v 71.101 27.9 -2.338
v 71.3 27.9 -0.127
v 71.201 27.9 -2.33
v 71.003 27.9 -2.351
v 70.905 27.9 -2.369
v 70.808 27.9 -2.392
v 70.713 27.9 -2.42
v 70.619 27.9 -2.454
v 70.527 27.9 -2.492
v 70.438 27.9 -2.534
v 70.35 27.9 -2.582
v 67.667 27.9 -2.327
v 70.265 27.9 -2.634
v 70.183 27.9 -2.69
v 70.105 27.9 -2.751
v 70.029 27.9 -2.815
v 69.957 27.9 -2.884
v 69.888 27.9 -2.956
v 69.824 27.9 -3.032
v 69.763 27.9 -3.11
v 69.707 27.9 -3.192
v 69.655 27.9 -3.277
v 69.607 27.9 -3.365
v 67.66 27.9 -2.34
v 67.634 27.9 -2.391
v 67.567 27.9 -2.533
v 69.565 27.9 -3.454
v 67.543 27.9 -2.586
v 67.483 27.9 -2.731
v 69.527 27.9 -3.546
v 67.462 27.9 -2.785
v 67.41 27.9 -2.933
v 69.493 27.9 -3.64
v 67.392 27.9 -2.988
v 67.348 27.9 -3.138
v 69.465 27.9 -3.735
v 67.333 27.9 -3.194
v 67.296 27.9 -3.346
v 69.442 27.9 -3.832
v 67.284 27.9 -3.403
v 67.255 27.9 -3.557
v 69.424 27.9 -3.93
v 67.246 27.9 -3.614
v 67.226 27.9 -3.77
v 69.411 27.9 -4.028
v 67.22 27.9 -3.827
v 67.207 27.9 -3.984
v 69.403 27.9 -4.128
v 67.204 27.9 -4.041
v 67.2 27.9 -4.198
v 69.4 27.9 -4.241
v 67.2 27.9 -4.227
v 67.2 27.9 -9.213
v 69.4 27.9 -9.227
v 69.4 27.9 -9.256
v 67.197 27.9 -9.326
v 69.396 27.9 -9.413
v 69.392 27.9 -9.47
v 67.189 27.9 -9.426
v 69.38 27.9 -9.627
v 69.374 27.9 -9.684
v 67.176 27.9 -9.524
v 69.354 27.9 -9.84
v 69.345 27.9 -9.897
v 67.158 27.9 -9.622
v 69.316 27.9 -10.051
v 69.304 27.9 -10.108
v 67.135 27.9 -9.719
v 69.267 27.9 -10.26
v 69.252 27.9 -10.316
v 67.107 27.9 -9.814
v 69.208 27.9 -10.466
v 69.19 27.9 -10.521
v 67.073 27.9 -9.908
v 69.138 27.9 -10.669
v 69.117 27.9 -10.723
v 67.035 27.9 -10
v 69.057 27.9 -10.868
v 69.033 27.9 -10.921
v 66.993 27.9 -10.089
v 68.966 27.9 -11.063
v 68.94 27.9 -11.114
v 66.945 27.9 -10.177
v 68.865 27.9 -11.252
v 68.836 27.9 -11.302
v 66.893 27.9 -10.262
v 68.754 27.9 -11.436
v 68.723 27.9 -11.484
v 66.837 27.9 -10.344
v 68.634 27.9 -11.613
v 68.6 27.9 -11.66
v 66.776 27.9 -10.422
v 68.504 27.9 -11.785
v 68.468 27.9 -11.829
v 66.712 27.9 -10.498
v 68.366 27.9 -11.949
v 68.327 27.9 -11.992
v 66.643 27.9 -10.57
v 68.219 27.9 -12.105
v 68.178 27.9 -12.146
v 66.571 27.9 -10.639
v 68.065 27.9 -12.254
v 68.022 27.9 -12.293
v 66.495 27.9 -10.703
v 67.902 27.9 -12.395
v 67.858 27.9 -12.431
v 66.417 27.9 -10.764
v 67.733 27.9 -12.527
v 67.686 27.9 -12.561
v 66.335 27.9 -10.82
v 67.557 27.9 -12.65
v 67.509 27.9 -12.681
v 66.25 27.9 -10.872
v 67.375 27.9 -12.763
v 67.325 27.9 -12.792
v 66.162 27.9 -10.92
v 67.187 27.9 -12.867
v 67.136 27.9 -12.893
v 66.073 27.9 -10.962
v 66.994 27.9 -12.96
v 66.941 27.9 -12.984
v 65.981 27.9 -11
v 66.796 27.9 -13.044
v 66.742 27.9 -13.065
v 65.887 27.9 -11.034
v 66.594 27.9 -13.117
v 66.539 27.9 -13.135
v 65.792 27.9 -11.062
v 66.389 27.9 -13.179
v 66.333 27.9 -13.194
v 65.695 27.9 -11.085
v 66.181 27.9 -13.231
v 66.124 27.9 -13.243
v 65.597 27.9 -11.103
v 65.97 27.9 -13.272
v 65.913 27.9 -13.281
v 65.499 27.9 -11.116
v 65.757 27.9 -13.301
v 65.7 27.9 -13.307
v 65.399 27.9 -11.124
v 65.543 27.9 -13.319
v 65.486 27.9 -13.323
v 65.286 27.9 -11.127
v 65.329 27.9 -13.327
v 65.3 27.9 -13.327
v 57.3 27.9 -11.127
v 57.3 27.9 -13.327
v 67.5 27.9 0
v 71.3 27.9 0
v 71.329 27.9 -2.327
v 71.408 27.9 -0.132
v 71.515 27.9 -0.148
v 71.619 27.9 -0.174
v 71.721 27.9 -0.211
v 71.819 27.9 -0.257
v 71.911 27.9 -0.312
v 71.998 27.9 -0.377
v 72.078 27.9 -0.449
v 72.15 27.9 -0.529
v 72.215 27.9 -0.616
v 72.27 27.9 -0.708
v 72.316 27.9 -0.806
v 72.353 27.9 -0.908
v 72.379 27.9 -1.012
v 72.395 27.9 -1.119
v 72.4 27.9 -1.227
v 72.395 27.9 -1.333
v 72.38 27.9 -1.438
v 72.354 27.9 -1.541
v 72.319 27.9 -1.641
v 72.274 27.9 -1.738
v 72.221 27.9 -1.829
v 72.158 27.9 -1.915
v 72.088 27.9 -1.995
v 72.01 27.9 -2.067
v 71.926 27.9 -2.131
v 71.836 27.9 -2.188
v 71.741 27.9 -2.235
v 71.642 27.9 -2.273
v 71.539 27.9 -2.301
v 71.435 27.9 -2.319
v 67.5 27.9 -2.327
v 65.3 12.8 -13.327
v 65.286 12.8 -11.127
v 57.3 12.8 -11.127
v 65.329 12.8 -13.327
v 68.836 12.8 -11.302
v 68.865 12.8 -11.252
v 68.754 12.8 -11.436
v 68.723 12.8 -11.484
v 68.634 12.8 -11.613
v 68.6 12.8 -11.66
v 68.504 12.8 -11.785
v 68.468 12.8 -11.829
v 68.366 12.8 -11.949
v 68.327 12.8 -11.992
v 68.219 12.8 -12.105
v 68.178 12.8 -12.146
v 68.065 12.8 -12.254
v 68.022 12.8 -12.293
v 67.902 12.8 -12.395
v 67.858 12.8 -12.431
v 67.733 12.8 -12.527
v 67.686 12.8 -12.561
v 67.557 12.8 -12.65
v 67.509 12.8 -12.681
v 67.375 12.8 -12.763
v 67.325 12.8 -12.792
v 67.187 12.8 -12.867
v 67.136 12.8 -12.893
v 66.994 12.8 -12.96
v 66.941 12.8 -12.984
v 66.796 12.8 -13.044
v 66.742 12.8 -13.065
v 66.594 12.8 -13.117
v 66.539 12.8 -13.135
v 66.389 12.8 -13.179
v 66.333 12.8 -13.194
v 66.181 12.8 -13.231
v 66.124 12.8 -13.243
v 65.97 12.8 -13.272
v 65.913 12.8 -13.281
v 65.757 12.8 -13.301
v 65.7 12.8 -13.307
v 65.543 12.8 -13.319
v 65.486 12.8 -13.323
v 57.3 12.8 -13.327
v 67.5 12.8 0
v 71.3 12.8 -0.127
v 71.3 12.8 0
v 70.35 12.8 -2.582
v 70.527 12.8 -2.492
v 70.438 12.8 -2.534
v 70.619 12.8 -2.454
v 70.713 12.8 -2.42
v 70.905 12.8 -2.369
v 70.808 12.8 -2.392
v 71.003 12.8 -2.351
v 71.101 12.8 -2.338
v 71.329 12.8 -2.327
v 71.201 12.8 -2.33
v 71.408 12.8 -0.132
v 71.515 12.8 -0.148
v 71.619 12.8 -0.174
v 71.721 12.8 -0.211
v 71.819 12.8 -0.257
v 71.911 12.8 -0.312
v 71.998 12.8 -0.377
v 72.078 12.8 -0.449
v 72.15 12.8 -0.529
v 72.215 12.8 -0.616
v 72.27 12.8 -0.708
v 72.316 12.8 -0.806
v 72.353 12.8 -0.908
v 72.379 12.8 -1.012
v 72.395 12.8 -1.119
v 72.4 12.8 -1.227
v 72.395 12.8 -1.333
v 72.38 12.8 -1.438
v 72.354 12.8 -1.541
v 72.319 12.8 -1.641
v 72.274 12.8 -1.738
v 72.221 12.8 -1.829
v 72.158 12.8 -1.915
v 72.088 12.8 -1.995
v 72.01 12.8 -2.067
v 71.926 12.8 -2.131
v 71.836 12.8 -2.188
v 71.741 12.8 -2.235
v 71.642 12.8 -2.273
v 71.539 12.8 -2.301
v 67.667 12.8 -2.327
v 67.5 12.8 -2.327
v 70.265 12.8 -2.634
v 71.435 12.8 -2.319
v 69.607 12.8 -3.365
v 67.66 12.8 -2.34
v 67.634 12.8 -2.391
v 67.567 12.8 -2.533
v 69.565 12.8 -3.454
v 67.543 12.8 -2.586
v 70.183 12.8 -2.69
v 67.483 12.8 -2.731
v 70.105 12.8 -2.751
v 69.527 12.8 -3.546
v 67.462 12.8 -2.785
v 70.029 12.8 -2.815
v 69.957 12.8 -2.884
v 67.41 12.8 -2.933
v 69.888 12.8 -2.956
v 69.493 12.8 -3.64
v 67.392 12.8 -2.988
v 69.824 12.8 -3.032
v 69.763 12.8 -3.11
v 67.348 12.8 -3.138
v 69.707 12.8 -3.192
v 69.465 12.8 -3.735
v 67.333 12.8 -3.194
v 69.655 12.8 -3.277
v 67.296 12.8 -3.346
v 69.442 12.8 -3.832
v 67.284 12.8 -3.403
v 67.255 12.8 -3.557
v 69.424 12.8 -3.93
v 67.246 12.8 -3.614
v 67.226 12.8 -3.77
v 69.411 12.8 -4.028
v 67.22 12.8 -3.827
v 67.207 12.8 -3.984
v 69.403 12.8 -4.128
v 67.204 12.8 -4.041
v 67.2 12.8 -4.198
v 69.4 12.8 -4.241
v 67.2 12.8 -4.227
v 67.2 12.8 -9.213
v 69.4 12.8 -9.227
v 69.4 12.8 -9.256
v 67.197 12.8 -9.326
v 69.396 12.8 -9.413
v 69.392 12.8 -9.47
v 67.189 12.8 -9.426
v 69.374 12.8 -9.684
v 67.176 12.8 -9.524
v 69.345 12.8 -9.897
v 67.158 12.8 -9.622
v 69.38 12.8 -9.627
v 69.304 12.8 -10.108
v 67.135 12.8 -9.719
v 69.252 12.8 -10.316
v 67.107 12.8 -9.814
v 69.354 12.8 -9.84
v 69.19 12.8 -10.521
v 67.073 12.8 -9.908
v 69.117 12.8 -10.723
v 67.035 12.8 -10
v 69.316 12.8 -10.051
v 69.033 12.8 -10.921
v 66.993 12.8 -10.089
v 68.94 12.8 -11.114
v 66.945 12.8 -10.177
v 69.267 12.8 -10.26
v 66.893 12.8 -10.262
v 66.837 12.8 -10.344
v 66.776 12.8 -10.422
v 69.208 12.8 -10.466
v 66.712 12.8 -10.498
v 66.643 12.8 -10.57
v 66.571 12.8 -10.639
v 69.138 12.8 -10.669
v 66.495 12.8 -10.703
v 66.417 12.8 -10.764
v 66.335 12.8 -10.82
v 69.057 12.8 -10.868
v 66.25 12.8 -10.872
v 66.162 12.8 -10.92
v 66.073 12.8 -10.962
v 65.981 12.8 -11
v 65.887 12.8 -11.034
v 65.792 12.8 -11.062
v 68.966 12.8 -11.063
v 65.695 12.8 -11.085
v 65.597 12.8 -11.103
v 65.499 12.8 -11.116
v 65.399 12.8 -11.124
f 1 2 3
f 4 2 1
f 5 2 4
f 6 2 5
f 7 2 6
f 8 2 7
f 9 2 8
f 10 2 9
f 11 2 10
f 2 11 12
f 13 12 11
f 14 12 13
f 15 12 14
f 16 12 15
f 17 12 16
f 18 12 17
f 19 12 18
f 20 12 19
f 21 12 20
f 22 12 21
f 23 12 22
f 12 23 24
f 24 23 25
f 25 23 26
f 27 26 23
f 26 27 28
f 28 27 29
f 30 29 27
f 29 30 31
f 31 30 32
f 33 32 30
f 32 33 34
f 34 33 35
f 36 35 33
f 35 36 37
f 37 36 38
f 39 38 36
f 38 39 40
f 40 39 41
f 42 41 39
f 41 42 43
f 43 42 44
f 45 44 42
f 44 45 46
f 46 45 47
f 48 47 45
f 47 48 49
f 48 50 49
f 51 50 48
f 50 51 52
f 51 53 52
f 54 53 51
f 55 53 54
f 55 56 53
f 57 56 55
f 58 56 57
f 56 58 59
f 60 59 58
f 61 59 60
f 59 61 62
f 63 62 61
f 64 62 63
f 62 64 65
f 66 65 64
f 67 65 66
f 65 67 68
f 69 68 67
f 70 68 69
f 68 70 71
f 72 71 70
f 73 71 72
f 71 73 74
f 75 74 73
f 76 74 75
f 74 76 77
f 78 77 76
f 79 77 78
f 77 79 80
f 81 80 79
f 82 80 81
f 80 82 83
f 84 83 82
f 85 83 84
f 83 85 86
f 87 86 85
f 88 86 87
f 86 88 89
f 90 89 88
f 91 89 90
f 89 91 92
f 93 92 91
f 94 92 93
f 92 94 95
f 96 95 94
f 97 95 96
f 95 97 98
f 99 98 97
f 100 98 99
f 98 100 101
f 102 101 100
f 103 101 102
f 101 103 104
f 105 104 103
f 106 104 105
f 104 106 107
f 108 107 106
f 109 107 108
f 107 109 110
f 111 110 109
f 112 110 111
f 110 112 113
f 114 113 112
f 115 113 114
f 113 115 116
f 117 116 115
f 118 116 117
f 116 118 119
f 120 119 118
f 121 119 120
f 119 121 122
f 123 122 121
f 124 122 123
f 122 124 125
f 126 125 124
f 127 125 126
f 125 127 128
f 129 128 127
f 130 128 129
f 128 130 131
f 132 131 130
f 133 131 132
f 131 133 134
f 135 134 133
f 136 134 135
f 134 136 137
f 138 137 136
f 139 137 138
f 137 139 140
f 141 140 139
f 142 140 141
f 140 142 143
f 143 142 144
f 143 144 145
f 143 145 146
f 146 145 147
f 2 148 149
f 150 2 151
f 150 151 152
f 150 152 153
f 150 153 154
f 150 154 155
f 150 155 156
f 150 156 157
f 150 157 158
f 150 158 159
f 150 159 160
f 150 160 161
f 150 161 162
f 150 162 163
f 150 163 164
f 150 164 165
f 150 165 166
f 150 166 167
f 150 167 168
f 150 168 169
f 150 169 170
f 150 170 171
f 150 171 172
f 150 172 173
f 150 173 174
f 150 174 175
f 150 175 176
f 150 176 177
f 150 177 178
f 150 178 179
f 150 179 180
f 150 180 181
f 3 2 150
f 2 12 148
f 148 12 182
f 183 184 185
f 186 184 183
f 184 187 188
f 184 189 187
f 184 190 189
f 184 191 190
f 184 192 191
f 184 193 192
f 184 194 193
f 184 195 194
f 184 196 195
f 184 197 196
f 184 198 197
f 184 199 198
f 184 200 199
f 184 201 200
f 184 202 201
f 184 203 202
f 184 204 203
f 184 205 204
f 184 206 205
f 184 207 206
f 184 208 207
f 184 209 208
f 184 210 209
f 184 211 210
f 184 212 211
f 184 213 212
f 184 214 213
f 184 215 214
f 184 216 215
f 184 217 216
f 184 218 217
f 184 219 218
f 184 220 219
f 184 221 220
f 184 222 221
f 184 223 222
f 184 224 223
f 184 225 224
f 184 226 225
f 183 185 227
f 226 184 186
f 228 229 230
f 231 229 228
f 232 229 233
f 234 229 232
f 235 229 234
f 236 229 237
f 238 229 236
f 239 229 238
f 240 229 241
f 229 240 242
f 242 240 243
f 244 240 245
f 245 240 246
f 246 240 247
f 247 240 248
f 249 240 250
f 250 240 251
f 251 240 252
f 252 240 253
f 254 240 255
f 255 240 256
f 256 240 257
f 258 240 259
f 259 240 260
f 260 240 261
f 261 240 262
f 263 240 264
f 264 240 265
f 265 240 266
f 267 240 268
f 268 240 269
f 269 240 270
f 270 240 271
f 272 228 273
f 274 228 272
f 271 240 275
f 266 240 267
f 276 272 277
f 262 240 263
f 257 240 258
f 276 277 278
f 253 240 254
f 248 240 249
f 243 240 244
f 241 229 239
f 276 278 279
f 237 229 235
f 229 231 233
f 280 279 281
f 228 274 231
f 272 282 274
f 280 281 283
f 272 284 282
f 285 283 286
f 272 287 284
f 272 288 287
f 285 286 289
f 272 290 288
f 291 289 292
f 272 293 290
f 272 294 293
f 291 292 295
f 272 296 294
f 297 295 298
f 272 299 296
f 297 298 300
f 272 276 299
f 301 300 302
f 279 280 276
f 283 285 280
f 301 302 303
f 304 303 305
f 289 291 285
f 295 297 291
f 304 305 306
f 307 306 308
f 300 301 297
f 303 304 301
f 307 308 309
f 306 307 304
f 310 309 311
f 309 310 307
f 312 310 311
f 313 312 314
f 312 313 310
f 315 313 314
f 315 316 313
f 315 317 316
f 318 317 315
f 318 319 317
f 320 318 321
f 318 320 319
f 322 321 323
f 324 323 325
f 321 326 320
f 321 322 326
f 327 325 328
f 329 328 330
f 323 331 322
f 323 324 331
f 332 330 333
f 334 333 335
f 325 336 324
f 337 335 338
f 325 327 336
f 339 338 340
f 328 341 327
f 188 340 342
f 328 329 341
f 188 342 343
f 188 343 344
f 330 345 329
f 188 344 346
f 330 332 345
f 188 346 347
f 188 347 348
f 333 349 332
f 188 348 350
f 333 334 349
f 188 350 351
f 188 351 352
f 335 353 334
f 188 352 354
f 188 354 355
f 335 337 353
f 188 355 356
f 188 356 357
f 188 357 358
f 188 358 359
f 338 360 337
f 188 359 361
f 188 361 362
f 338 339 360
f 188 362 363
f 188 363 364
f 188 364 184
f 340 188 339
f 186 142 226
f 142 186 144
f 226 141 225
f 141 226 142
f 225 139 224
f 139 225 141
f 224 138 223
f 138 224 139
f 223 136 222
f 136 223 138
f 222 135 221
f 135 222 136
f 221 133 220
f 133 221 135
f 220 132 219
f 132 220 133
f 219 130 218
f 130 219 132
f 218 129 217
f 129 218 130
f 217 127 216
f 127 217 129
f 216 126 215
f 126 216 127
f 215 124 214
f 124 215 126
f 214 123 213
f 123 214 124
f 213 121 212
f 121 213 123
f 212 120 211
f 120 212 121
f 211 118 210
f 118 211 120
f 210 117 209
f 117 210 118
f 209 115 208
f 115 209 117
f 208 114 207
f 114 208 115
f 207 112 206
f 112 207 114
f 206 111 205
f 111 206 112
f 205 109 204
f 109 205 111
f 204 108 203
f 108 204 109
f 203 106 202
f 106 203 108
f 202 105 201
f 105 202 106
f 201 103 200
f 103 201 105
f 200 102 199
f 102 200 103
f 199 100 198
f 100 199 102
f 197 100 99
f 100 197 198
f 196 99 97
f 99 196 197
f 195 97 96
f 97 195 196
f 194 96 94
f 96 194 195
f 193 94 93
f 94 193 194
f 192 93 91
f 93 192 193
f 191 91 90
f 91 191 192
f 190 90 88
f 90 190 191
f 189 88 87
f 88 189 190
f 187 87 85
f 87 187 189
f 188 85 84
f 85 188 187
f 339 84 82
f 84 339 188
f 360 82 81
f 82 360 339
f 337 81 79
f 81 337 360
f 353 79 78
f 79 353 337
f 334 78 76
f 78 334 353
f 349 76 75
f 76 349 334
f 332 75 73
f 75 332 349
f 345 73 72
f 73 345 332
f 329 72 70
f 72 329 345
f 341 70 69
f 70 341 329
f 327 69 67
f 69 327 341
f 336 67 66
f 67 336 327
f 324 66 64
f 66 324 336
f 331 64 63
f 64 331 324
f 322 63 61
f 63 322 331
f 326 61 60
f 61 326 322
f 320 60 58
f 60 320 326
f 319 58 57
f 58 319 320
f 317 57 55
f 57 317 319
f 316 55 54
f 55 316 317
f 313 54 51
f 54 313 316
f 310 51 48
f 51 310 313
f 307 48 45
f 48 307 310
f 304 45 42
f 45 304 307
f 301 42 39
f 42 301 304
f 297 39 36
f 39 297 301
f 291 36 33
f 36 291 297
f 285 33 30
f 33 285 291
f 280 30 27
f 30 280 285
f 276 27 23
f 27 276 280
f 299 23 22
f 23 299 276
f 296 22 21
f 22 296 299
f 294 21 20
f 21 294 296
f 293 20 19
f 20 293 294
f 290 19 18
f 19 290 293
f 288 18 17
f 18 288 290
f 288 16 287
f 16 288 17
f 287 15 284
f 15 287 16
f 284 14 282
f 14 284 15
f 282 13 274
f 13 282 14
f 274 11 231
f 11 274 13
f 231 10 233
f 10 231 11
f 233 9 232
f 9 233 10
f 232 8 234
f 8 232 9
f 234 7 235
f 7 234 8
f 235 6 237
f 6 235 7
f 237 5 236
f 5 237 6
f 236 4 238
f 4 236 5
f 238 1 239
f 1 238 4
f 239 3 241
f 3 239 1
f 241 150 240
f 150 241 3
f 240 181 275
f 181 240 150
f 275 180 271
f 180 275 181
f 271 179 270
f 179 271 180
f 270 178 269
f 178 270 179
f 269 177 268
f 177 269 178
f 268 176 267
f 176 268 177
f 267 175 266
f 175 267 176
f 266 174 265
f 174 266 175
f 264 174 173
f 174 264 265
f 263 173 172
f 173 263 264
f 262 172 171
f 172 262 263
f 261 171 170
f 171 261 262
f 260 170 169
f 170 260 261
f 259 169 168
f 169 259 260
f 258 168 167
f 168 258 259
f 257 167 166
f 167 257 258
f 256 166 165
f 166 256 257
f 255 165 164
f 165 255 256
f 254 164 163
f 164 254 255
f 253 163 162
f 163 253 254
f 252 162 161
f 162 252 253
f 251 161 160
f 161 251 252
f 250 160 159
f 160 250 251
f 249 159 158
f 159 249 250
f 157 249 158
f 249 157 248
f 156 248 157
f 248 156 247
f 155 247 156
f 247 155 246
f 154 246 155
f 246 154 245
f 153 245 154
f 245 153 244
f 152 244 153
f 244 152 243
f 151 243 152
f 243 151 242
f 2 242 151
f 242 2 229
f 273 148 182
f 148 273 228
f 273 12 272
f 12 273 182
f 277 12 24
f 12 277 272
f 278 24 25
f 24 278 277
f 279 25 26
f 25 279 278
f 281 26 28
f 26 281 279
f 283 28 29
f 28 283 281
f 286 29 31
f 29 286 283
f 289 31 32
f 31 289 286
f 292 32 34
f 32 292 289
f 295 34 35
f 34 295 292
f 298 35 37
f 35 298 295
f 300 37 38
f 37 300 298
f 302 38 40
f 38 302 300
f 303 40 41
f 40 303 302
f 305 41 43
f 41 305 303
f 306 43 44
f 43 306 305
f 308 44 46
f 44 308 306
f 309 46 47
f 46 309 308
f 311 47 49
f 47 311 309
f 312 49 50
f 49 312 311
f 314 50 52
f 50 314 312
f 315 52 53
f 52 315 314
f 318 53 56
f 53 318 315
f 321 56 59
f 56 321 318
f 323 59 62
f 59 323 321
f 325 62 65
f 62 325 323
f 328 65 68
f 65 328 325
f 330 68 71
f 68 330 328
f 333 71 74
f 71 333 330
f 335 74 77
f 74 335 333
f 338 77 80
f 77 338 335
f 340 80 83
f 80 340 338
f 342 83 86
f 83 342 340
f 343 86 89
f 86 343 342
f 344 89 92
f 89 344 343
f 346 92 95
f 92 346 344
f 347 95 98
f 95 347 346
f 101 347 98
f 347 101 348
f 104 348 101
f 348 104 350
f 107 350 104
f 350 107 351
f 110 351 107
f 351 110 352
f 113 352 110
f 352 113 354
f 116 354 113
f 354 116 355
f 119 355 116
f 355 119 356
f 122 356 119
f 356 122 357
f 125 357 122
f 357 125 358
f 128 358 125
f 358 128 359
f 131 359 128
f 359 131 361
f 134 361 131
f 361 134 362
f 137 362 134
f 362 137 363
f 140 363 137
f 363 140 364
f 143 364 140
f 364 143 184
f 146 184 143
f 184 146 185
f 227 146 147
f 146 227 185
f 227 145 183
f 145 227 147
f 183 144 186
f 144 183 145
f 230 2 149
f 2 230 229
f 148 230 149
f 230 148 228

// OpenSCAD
// Current construction:200 unbonded C110 leaves, each0.010..0.011mm; see FLEX_CONSTRUCTION_W02_T03.json.
// T02 coordinated candidate: thermal reevaluation required.
module foil_packet(){translate([0,27.9,0])rotate([90,0,0])linear_extrude(15.1)polygon(points=[[67.5, -2.327], [67.5, -0.127], [71.3, -0.127], [71.40781885436252, -0.13229680066058358], [71.51459935421774, -0.14813619155644653], [71.61931314497991, -0.17436563069457023], [71.72095177560159, -0.21073251423758466], [71.8185364105086, -0.2568866092168096], [71.91112725632156, -0.3123834264672003], [71.99783261258001, -0.3766885013009893], [72.0778174593052, -0.4491825406947978], [72.15031149869901, -0.52916738741999], [72.2146165735328, -0.6158727436784377], [72.2701133907832, -0.7084635894914025], [72.31626748576241, -0.8060482243984013], [72.35263436930542, -0.9076868550200916], [72.37886380844355, -1.012400645782259], [72.39470319933942, -1.1191811456374834], [72.39999999999999, -1.227], [72.39487815202365, -1.3330275069087165], [72.37956030505222, -1.438067637868891], [72.35418910578301, -1.5411422118219895], [72.31900082226262, -1.6412913518625305], [72.27432314365242, -1.7375824240446052], [72.22057212863925, -1.8291187224896746], [72.15824833090943, -1.9150478199160048], [72.08793213776713, -1.994569505825846], [72.01027836530604, -2.066943238426374], [71.92601016046679, -2.1314950408887503], [71.83591226676653, -2.187623777724227], [71.74082371641346, -2.234806752828848], [71.64163001686069, -2.2726045770652346], [71.53925490456152, -2.300665260052341], [71.43465174271914, -2.3187274880585806], [71.32879464313866, -2.326623057473113], [71.2005814175485, -2.32998043894255], [71.10143533452094, -2.3377834049017934], [71.00283350343949, -2.350764582230358], [70.90504618506925, -2.3688883904235123], [70.8083414076529, -2.3921051533827487], [70.71298423226331, -2.420351235574614], [70.61923602629022, -2.4535492164511146], [70.52735374704972, -2.4916081026542893], [70.43758923748254, -2.534423577422475], [70.35018853586998, -2.581878286515418], [70.26539120145998, -2.6338421598740327], [70.18342965785214, -2.69017276813329], [70.10452855594019, -2.750715713011612], [70.02890415816007, -2.8153050505054087], [69.9567637457299, -2.883763745729839], [69.88830505050534, -2.955904158160167], [69.82371571301162, -3.031528555940172], [69.7631727681333, -3.1104296578521233], [69.70684215987407, -3.1923912014599107], [69.65487828651533, -3.2771885358701187], [69.60742357742251, -3.3645892374824644], [69.56460810265428, -3.454353747049748], [69.52654921645117, -3.5462360262900696], [69.49335123557458, -3.639984232263409], [69.46510515338277, -3.735341407652838], [69.4418883904235, -3.8320461850692933], [69.42376458223035, -3.9298335034395655], [69.41078340490178, -4.028435334520958], [69.40298043894254, -4.127581417548563], [69.39999999999999, -4.241399788793378], [69.39999999999999, -9.227], [69.39962305747311, -9.25579464313863], [69.39551166173683, -9.412802511867461], [69.39249767137017, -9.470312874029457], [69.38017475321126, -9.626890395103587], [69.374155033616, -9.684164201245066], [69.35365436929659, -9.839882206562798], [69.34464542010576, -9.896762473162042], [69.31602320052177, -10.051194150494627], [69.30404971463885, -10.107524972694822], [69.26738439130463, -10.260247035549106], [69.25247918722222, -10.315874014481835], [69.20787125724048, -10.466467862299114], [69.19007518908685, -10.521238528281998], [69.137646919693, -10.669291393793058], [69.11700876525404, -10.723055624237448], [69.05690385869025, -10.868161704828948], [69.03348018571265, -10.920772135716533], [68.96586338534995, -11.062533705707772], [68.93971839649325, -11.113846135504243], [68.86477503528145, -11.251874636285603], [68.83598039214282, -11.301748421187552], [68.75391588462577, -11.435665526232635], [68.72255051132049, -11.483963965662385], [68.63358979060907, -11.613402617494723], [68.5997396574452, -11.659993328787014], [68.50412655869127, -11.784598745059107], [68.46788444653096, -11.829354026312698], [68.36588103859224, -11.948784672239759], [68.3273462845457, -11.991581852339715], [68.21923215167315, -12.105510376822783], [68.17851037682276, -12.146232151673171], [68.06458185233969, -12.254346284545711], [68.02178467223976, -12.292881038592228], [67.9023540263127, -12.394884446530959], [67.85759874505911, -12.431126558691263], [67.73299332878702, -12.526739657445193], [67.68640261749475, -12.560589790609049], [67.55696396566242, -12.649550511320477], [67.50866552623262, -12.680915884625781], [67.37474842118753, -12.762980392142826], [67.32487463628556, -12.79177503528148], [67.1868461355042, -12.866718396493267], [67.13553370570774, -12.892863385349957], [66.9937721357165, -12.960480185712656], [66.94116170482901, -12.983903858690207], [66.79605562423752, -13.04400876525401], [66.74229139379304, -13.064646919693004], [66.59423852828198, -13.11707518908686], [66.53946786229916, -13.134871257240471], [66.38887401448189, -13.179479187222215], [66.33324703554904, -13.194384391304654], [66.18052497269474, -13.231049714638866], [66.12419415049463, -13.243023200521767], [65.96976247316205, -13.271645420105763], [65.91288220656276, -13.280654369296604], [65.75716420124503, -13.301155033616011], [65.6998903951036, -13.30717475321126], [65.54331287402945, -13.319497671370163], [65.48580251186748, -13.322511661736836], [65.32879464313865, -13.326623057473114], [65.3, -13.327], [57.3, -13.327], [57.3, -11.127], [65.28560021120666, -11.127], [65.39941858245152, -11.12401956105745], [65.498564665479, -11.116216595098212], [65.59716649656053, -11.103235417769637], [65.69495381493076, -11.085111609576485], [65.7916585923471, -11.061894846617248], [65.88701576773667, -11.033648764425392], [65.98076397370978, -11.000450783548882], [66.0726462529503, -10.962391897345704], [66.1624107625175, -10.919576422577503], [66.24981146412995, -10.87212171348463], [66.33460879853999, -10.820157840125988], [66.4165703421479, -10.763827231866665], [66.49547144405982, -10.703284286988378], [66.57109584183986, -10.638694949494633], [66.64323625427006, -10.570236254270185], [66.71169494949473, -10.49809584183977], [66.77628428698836, -10.422471444059855], [66.83682723186669, -10.343570342147883], [66.89315784012592, -10.26160879854008], [66.94512171348467, -10.176811464129878], [66.99257642257753, -10.089410762517462], [67.03539189734565, -9.99964625295044], [67.07345078354886, -9.907763973709809], [67.1066487644254, -9.814015767736626], [67.13489484661723, -9.718658592347161], [67.1581116095765, -9.621953814930702], [67.17623541776965, -9.524166496560431], [67.18921659509822, -9.425564665479046], [67.19701956105746, -9.326418582451439], [67.2, -9.212600211206624], [67.2, -4.227], [67.20037694252689, -4.19820535686137], [67.20448833826316, -4.041197488132539], [67.20750232862983, -3.983687125970544], [67.21982524678873, -3.827109604896414], [67.22584496638399, -3.7698357987549334], [67.2463456307034, -3.6141177934372015], [67.25535457989423, -3.5572375268379597], [67.28397679947822, -3.402805849505375], [67.29595028536114, -3.346475027305181], [67.33261560869536, -3.193752964450896], [67.34752081277777, -3.1381259855181667], [67.39212874275951, -2.9875321377008874], [67.40992481091314, -2.9327614717179973], [67.462353080307, -2.784708606206939], [67.482991234746, -2.730944375762471], [67.5430961413098, -2.58583829517097], [67.56651981428732, -2.53322786428355], [67.63413661465, -2.391466294292311], [67.66028160350675, -2.340153864495755], [67.66742356920699, -2.327], [67.5, -2.327]]);}
color([.8,.4,.1])foil_packet();
color([1,1,1,.6])translate([67.5,12.8,-.127])cube([3.8,15.1,.127]);
